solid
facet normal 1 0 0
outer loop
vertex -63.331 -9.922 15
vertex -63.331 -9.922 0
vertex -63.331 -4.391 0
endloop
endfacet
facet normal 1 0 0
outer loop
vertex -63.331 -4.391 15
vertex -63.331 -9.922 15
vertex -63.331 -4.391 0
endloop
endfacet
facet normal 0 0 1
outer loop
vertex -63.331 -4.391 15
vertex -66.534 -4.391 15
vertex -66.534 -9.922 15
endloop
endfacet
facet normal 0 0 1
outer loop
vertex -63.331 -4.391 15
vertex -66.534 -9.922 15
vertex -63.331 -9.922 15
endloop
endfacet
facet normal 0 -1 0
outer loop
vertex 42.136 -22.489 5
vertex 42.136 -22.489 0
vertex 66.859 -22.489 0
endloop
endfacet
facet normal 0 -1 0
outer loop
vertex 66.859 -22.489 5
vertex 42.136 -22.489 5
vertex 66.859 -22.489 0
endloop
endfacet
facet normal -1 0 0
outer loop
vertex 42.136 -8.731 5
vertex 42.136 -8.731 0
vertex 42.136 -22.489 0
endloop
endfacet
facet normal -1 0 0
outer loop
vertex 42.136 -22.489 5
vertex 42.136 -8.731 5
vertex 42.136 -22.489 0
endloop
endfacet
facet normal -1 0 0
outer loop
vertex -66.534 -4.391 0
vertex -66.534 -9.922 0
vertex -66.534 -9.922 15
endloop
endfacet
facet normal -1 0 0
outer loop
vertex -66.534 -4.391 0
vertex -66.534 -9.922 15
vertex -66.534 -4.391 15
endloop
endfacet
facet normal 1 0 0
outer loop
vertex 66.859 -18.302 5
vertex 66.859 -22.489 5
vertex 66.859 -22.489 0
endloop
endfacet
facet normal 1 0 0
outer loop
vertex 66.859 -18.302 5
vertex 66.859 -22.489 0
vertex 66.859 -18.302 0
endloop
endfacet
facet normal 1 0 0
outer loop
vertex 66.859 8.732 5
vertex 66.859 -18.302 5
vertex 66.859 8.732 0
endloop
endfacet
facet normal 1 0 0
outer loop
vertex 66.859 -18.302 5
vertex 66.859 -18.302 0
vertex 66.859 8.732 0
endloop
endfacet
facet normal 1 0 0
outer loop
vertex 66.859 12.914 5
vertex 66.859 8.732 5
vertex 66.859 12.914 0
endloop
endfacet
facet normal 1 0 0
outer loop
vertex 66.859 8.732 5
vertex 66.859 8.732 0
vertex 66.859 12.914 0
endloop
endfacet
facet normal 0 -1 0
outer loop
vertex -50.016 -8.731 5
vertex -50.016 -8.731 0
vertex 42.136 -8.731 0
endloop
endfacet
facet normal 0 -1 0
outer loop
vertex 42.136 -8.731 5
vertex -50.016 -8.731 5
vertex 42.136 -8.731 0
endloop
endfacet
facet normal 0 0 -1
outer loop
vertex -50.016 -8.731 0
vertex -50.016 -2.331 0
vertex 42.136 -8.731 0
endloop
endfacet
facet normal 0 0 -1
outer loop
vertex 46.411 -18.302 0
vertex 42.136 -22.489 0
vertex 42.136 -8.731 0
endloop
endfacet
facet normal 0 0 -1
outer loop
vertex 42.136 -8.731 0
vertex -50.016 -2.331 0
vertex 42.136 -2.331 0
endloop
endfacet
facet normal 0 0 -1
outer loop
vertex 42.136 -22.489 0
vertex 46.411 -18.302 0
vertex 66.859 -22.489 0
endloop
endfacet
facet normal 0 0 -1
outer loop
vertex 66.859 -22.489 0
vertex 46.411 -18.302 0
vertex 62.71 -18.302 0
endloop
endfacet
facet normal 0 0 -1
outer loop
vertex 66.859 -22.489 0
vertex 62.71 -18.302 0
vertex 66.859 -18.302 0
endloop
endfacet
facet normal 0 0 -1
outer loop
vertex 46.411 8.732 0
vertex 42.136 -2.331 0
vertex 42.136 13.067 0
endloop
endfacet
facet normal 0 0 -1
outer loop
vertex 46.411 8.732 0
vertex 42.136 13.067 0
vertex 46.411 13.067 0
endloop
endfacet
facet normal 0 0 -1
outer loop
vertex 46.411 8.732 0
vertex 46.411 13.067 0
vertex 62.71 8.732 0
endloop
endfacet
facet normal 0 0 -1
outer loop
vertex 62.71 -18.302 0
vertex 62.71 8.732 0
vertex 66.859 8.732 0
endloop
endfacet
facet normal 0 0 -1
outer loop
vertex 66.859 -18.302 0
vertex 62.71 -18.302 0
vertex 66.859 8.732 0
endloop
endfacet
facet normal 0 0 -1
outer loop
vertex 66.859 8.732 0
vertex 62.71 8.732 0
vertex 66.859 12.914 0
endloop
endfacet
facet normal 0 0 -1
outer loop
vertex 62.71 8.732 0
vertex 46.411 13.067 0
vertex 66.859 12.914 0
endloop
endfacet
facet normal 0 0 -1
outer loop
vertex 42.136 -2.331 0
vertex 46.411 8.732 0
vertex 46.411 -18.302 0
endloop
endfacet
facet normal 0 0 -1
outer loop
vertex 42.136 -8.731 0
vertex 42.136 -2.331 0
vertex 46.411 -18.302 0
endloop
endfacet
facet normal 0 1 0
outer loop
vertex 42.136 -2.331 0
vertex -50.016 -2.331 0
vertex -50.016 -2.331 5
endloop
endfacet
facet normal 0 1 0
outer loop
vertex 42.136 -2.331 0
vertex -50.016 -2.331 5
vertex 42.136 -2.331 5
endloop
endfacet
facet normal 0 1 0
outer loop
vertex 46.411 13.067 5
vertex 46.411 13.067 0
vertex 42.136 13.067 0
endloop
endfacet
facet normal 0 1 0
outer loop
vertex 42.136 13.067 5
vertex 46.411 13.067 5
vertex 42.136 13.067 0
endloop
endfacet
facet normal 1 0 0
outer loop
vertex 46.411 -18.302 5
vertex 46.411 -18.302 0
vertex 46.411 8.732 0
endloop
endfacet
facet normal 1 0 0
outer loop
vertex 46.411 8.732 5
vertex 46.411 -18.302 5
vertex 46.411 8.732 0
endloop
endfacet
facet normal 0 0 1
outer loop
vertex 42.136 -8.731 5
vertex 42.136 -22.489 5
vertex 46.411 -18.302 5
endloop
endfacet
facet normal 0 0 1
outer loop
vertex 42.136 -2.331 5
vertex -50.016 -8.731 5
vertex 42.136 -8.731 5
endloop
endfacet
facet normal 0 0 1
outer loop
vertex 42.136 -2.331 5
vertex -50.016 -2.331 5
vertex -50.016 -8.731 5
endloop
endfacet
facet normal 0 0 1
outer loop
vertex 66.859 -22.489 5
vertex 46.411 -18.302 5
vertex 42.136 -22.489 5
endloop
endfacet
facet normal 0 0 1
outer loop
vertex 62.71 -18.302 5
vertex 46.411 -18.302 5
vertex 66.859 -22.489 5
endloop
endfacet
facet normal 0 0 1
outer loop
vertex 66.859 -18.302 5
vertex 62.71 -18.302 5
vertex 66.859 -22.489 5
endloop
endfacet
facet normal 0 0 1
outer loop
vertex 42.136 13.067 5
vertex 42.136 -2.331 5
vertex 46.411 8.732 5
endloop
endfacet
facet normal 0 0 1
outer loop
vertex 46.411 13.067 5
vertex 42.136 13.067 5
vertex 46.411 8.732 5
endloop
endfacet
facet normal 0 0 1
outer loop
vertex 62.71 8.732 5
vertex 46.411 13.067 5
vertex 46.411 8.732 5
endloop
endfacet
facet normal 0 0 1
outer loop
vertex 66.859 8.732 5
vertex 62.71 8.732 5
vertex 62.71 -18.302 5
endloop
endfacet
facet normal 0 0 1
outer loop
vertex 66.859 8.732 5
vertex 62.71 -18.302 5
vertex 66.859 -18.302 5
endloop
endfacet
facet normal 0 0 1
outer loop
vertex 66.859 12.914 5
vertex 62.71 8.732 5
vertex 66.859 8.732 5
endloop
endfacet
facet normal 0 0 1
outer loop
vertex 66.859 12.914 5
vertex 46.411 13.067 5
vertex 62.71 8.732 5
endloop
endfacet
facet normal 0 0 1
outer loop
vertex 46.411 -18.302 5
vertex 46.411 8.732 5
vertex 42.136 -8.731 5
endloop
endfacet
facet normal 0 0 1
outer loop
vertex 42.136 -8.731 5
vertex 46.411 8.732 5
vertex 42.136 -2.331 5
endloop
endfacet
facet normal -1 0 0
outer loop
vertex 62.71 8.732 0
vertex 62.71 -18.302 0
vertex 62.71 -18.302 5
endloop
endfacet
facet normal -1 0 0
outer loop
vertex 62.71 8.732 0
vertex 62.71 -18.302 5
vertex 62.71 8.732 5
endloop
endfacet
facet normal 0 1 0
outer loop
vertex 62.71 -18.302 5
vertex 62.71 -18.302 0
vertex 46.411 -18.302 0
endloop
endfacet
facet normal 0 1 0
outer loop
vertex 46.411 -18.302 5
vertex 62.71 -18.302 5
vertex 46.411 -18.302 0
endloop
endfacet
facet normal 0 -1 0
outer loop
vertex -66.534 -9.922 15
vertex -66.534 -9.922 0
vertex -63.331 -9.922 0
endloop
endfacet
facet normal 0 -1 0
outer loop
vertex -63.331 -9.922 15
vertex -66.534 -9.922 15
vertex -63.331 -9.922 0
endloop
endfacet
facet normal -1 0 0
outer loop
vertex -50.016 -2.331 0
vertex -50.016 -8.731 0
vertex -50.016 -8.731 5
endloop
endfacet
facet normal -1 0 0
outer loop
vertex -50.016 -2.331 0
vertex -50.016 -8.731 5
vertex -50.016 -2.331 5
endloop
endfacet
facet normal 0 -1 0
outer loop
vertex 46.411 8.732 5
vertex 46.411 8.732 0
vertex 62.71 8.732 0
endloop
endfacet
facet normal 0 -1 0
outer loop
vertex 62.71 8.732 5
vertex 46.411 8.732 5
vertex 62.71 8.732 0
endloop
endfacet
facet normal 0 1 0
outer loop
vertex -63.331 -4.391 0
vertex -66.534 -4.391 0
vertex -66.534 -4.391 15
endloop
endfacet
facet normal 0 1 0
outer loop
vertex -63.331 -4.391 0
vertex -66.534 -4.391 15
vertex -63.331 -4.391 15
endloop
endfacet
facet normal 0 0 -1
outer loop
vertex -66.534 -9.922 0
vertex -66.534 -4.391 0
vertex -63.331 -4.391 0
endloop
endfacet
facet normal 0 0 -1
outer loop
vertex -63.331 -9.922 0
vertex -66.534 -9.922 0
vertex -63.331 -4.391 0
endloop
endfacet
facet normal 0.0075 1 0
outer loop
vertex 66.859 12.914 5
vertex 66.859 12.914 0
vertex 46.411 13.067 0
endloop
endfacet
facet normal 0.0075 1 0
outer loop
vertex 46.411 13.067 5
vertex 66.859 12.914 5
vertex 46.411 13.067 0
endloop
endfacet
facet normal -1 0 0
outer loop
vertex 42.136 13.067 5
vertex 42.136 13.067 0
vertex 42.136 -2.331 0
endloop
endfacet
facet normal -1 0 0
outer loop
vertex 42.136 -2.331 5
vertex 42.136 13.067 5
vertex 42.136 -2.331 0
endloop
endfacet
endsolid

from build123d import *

# Parameters (mm, degrees)
F0_W     = 49.7284270823
F0_H     = 6.4000934362
F1_DEPTH = 5
F0_W_2   = 42.4240119755
F0_W_3   = 4.1491761804
F0_H_2   = 27.0344465971
F2_DEPTH = 5
F3_W     = 3.2034143806
F3_H     = 5.5307373405
F4_DEPTH = 15


with BuildPart() as f1:
    # F0 (on Top) → F1 (new body)
    with BuildSketch(Plane.XY):
        with Locations((17.2720532864, -5.5312477052)):
            Rectangle(F0_W, F0_H)
    extrude(amount=F1_DEPTH)

    # F0 (on Top) → F2 (join)
    with BuildSketch(Plane.XY):
        with Locations((17.2720532864, -5.5312477052)):
            Rectangle(F0_W, F0_H)
        with Locations((-28.8041662425, -5.5312477052)):
            Rectangle(F0_W_2, F0_H)
        Polygon((42.1362668276, 13.0670443177), (42.1362668276, -2.3312009871), (42.1362668276, -8.7312944233), (42.1362668276, -22.4892254919), (46.4107766747, -22.4892254919), (46.4107766747, -18.3021239936), (46.4107766747, 8.7323226035), (46.4107766747, 13.0670443177), align=None)
        Polygon((66.8589994311, 12.9136461765), (46.4107766747, 13.0670443177), (46.4107766747, 8.7323226035), (62.7098232508, 8.7323226035), (66.8589994311, 8.7323226035), align=None)
        Polygon((46.4107766747, -18.3021239936), (46.4107766747, -22.4892254919), (66.8589994311, -22.4892254919), (66.8589994311, -18.3021239936), (62.7098232508, -18.3021239936), align=None)
        with Locations((64.784411341, -4.7849006951)):
            Rectangle(F0_W_3, F0_H_2)
    extrude(amount=F2_DEPTH)


with BuildPart() as f4:
    # F3 (on face) → F4 (new body)
    with BuildSketch(Plane.XY):
        with Locations((-64.9323798716, -7.1561746299)):
            Rectangle(F3_W, F3_H)
    extrude(amount=F4_DEPTH)


solid = Compound([f1.part, f4.part])
